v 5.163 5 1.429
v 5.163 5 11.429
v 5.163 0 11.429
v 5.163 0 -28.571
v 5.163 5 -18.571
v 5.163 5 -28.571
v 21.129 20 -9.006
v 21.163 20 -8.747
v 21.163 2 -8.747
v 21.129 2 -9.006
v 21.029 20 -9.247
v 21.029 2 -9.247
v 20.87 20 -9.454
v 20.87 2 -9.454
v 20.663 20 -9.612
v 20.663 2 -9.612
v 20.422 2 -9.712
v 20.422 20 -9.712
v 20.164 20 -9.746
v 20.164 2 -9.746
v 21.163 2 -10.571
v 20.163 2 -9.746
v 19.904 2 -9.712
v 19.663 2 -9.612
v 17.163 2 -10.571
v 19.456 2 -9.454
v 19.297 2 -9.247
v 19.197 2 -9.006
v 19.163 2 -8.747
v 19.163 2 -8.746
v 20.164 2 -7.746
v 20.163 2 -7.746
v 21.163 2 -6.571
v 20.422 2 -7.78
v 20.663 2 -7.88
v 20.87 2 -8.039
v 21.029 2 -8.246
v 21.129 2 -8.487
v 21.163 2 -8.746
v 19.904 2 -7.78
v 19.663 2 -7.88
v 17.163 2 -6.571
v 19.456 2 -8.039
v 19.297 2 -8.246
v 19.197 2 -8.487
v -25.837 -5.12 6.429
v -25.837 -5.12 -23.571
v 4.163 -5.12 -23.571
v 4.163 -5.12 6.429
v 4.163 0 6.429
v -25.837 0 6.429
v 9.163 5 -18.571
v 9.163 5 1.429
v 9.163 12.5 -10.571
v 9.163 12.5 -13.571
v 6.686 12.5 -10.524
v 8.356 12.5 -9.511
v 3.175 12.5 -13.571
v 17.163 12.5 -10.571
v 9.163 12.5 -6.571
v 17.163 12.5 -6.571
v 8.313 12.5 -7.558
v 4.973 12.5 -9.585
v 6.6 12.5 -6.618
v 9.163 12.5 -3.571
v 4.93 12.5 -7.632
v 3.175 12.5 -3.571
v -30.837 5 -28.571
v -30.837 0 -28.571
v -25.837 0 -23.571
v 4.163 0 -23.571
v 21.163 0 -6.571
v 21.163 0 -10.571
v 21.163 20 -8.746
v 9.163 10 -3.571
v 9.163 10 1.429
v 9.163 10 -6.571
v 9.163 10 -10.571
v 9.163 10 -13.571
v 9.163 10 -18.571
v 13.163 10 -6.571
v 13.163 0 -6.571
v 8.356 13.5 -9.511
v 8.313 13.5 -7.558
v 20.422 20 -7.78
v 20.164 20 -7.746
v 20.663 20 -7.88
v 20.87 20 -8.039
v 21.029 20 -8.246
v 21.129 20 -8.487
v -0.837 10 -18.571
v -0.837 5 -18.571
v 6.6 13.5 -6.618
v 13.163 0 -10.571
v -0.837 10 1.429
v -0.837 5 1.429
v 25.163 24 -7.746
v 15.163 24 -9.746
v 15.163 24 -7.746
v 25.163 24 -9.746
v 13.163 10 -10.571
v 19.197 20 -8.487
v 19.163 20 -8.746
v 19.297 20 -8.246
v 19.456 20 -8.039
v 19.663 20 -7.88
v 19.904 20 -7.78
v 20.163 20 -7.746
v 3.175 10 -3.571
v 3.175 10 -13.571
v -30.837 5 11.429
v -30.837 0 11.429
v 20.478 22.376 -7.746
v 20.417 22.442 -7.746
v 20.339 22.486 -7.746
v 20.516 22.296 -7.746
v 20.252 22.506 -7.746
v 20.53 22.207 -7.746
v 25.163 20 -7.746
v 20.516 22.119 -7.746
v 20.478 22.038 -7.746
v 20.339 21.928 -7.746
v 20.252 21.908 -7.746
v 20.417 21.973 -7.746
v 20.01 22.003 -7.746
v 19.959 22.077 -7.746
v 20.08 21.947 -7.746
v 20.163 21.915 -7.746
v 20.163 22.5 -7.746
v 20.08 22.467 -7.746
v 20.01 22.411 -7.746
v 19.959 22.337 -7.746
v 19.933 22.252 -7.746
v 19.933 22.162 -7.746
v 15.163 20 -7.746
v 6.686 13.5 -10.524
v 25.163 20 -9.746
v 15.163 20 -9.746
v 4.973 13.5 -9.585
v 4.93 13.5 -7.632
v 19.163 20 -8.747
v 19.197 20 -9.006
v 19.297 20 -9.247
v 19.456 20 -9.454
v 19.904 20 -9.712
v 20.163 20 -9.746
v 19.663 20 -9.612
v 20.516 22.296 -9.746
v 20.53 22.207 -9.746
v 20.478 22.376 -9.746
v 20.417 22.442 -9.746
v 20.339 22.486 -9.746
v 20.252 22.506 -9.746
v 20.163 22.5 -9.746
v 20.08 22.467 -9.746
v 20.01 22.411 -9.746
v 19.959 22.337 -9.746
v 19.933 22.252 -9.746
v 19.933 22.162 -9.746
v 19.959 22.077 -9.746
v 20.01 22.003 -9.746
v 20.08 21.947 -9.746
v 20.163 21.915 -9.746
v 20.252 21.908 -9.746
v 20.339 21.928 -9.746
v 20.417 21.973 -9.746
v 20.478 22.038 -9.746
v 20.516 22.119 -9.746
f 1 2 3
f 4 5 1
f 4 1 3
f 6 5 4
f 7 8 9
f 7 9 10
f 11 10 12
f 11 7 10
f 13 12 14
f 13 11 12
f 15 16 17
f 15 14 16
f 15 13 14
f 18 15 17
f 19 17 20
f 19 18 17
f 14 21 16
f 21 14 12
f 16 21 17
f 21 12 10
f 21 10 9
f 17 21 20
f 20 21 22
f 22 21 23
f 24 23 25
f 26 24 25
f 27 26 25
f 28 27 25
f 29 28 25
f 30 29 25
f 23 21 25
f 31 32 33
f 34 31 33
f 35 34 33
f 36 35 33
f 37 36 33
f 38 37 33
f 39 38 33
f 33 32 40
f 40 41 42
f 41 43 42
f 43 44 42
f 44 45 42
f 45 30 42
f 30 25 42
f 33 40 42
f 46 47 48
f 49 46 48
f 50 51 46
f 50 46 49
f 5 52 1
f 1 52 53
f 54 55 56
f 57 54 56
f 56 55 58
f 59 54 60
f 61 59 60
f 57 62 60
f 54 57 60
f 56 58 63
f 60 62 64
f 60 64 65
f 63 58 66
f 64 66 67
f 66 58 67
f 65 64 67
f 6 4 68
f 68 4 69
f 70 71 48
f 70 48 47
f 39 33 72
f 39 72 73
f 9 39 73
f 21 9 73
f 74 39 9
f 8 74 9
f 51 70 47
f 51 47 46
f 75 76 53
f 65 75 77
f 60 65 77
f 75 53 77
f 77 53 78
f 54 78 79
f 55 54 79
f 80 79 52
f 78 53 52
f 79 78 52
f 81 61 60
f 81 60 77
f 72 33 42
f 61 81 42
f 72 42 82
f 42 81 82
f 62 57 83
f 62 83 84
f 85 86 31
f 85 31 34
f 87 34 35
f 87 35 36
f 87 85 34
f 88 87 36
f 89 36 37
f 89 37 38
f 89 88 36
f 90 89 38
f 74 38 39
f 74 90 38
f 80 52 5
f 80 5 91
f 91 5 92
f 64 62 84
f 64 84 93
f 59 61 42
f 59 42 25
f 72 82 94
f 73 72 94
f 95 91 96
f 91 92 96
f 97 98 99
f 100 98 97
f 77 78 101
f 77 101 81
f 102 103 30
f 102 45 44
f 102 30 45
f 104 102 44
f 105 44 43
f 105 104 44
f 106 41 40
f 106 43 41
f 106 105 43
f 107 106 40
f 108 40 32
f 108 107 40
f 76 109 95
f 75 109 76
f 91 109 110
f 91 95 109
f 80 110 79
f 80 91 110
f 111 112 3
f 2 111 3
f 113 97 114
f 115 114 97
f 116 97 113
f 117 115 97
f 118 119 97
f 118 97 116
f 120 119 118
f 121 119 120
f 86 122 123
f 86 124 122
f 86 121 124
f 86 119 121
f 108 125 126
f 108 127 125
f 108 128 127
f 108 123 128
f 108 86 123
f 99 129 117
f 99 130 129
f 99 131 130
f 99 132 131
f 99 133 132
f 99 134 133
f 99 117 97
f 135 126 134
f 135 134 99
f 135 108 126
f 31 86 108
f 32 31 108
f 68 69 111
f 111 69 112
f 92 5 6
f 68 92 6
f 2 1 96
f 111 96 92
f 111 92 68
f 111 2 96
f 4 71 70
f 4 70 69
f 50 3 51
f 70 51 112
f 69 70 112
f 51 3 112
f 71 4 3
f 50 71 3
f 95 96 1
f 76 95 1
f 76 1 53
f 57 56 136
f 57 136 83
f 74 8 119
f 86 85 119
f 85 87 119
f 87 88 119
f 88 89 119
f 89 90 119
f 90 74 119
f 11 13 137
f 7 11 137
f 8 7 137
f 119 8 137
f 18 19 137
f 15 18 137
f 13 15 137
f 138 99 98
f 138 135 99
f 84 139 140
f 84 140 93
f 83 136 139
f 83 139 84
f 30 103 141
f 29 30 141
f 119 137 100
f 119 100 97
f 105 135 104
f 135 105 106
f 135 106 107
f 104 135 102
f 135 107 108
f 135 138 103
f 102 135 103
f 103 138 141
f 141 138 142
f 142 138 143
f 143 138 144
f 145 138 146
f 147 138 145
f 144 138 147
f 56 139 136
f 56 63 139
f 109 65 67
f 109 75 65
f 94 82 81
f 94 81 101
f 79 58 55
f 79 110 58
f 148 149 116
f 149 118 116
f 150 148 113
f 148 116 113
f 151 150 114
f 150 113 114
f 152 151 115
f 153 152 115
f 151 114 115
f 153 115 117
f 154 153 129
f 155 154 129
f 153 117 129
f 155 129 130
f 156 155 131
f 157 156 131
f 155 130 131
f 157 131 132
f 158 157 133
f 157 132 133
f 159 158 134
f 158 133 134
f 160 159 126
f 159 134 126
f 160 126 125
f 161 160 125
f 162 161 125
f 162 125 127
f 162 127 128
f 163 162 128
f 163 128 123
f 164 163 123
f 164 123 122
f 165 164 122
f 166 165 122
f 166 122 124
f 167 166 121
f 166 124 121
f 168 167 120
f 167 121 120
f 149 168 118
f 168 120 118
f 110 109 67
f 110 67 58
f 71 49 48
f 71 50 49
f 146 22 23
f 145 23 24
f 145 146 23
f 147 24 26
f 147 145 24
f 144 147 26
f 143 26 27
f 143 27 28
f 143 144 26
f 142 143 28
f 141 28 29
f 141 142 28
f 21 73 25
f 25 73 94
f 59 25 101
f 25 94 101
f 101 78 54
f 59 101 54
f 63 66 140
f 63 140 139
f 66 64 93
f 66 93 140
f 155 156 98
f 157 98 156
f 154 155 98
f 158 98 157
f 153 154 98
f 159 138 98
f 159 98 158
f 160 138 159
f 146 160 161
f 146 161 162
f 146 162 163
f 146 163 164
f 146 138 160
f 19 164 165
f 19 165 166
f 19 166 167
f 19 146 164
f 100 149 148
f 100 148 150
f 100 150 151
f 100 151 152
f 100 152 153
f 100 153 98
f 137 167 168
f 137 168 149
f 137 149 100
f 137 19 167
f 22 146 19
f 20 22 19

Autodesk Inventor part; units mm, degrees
ref_plane "YZ Plane" through (0, 0, 0) normal (1, 0, 0) x (0, 1, 0)
ref_plane "XZ Plane" through (0, 0, 0) normal (0, 1, 0) x (-1, 0, 0)
ref_plane "XY Plane" through (0, 0, 0) normal (0, 0, 1) x (1, 0, 0)
sketch "Sketch1" plane through (0, 0, 0) normal (0, 1, 0) x (-1, 0, 0)
  line L0 (30.8368, 11.4286) -> (-9.1632, 11.4286)
  line L1 (-9.1632, 11.4286) -> (-9.1632, -28.5714)
  line L2 (-9.1632, -28.5714) -> (30.8368, -28.5714)
  line L3 (30.8368, -28.5714) -> (30.8368, 11.4286)
  point P0 (0, 0)
  dimension "d0" = 40
  dimension "d1" = 40
extrude "Extrusion1" add sketch "Sketch1" along normal blind 5
sketch "Sketch7" plane through (9.1632, 0, -28.5714) normal (1, 0, 0) x (0, 0, -1)
  point P0 (-28.5714, 0)
sketch "Sketch8" plane through (0, 0, 0) normal (0, -1, 0) x (1, 0, 0)
  point P0 (0, 0)
sketch "Sketch11" plane through (0, 5, 0) normal (0, 1, 0) x (1, 0, 0)
  line L0 (9.1632, -11.4286) -> (9.1632, 28.5714) projected
  line L1 (9.1632, 18.5714) -> (-0.8368, 18.5714)
  line L2 (-0.8368, 18.5714) -> (-0.8368, -1.4286)
  line L3 (-0.8368, -1.4286) -> (9.1632, -1.4286)
  line L4 (9.1632, -1.4286) -> (9.1632, 18.5714)
  line L5 (-30.8368, -11.4286) -> (9.1632, -11.4286) projected
  point P0 (0, 0)
  dimension "d29" = 10
  dimension "d30" = 20
  dimension "d31" = 10
extrude "Extrusion7" add sketch "Sketch11" along normal blind 5
sketch "Sketch12" plane through (0, 10, 0) normal (0, 1, 0) x (1, 0, 0)
  line L0 (9.1632, -1.4286) -> (9.1632, 18.5714) projected
  line L1 (3.175, 13.5714) -> (9.1632, 13.5714)
  line L2 (9.1632, 13.5714) -> (9.1632, 3.5714)
  line L3 (9.1632, 3.5714) -> (3.175, 3.5714)
  line L4 (3.175, 3.5714) -> (3.175, 13.5714)
  line L5 (9.1632, 18.5714) -> (-0.8368, 18.5714) projected
  point P0 (0, 0)
  dimension "d34" = 10
  dimension "d35" = 5
extrude "Extrusion8" add sketch "Sketch12" along normal blind 2.5
sketch "Sketch13" plane through (9.1632, 0, 11.4286) normal (1, 0, 0) x (0, 0, -1)
  line L0 (25, 12.5) -> (15, 12.5) projected
  line L1 (30, 10) -> (10, 10) projected
  line L2 (18, 12.5) -> (22, 12.5)
  line L3 (22, 12.5) -> (22, 10)
  line L4 (22, 10) -> (18, 10)
  line L5 (18, 10) -> (18, 12.5)
  line L6 (15, 10) -> (15, 12.5) projected
  point P0 (11.4286, 0)
  dimension "d38" = 4
  dimension "d39" = 3
extrude "Extrusion9" add sketch "Sketch13" along normal blind 4 contours L3 L1 L5 L0
sketch "Sketch14" plane through (0, 0, 0) normal (0, -1, 0) x (1, 0, 0)
  line L0 (4.1632, 6.4286) -> (-25.8368, 6.4286)
  line L1 (-25.8368, 6.4286) -> (-25.8368, -23.5714)
  line L2 (-25.8368, -23.5714) -> (4.1632, -23.5714)
  line L3 (4.1632, -23.5714) -> (4.1632, 6.4286)
  line L4 (9.1632, 11.4286) -> (9.1632, -28.5714) projected
  line L5 (9.1632, -28.5714) -> (-30.8368, -28.5714) projected
  point P0 (0, 0)
  dimension "d42" = 30
  dimension "d43" = 30
  dimension "d44" = 5
  dimension "d45" = 5
extrude "Extrusion10" add sketch "Sketch14" along normal blind 4
sketch "Sketch15" plane through (13.1632, 0, 11.4286) normal (1, 0, 0) x (0, 0, -1)
  line L0 (25, 12.5) -> (15, 12.5) projected
  line L1 (18.0261, 12.5) -> (22.0261, 12.5)
  line L2 (22.0261, 12.5) -> (22.0261, -15.875)
  line L3 (22.0261, -15.875) -> (18.0261, -15.875)
  line L4 (18.0261, -15.875) -> (18.0261, 12.5)
  point P0 (11.4286, 0)
  dimension "d48" = 4
extrude "Extrusion11" add sketch "Sketch15" along normal blind 4
sketch "Sketch30" plane through (13.1632, -15.875, -6.5975) normal (0, 0, 1) x (1, 0, 0)
  point P0 (-13.1632, 15.875)
sketch "Sketch31" plane through (17.1632, 0, 11.4286) normal (1, 0, 0) x (0, 0, -1)
  line L0 (18.0261, 10) -> (18.0261, -15.875) projected
  line L1 (22.0261, -15.875) -> (22.0261, 12.5) projected
  line L2 (18.0261, -15.875) -> (22.0261, -15.875)
  line L3 (22.0261, -15.875) -> (22.0261, -13.875)
  line L4 (22.0261, -13.875) -> (18.0261, -13.875)
  line L5 (18.0261, -13.875) -> (18.0261, -15.875)
  line L6 (18.0261, 12.5) -> (22.0261, 12.5)
  line L7 (22.0261, 12.5) -> (22.0261, -15.875)
  line L8 (22.0261, -15.875) -> (18.0261, -15.875)
  line L9 (18.0261, -15.875) -> (18.0261, 12.5)
  point P0 (11.4286, 0)
  dimension "d75" = 2
extrude "Extrusion21" cut sketch "Sketch31" against normal blind 4 contours L9 L6 L1 L4 L0
sketch "Sketch32" plane through (17.1632, 0, 11.4286) normal (1, 0, 0) x (0, 0, -1)
  line L0 (15.875, -11.1125) -> (23.8125, -11.1125)
  line L1 (23.8125, -11.1125) -> (23.8125, -20.6375)
  line L2 (23.8125, -20.6375) -> (15.875, -20.6375)
  line L3 (15.875, -20.6375) -> (15.875, -11.1125)
  point P0 (11.4286, 0)
extrude "Extrusion22" cut sketch "Sketch32" against normal blind 4
sketch "Sketch33" plane through (13.1632, 0, 11.4286) normal (1, 0, 0) x (0, 0, -1)
  line L0 (25, 12.5) -> (15, 12.5) projected
  line L1 (5, 0) -> (35, 0) projected
  line L2 (18, 12.5) -> (22, 12.5)
  line L3 (22, 12.5) -> (22, 0)
  line L4 (22, 0) -> (18, 0)
  line L5 (18, 0) -> (18, 12.5)
  line L6 (18, 12.5) -> (18, 10) projected
  point P0 (11.4286, 0)
  dimension "d80" = 4
  dimension "d81" = 0
extrude "Extrusion23" add sketch "Sketch33" along normal blind 4
sketch "Sketch34" plane through (17.1632, 0, 11.4286) normal (1, 0, 0) x (0, 0, -1)
  line L0 (5, 0) -> (35, 0) projected
  line L1 (22, 0) -> (22, 10) projected
  line L2 (18, 0) -> (22, 0)
  line L3 (22, 0) -> (22, 2)
  line L4 (22, 2) -> (18, 2)
  line L5 (18, 2) -> (18, 0)
  line L6 (18, 12.5) -> (18, 0) projected
  point P0 (11.4286, 0)
  dimension "d84" = 2
  dimension "d85" = 0
extrude "Extrusion24" add sketch "Sketch34" along normal blind 2
sketch "Sketch35" plane through (17.1632, 2, -6.5714) normal (0, 1, 0) x (1, 0, 0)
  point P0 (-17.1632, -6.5714)
sketch "Sketch36" plane through (19.1632, 0, 11.4286) normal (1, 0, 0) x (0, 0, -1)
  line L0 (22, 0) -> (22, 10) projected
  line L1 (22, 2) -> (18, 2)
  line L2 (18, 2) -> (18, 0)
  line L3 (18, 0) -> (22, 0)
  line L4 (22, 0) -> (22, 2)
  point P0 (11.4286, 0)
  dimension "d88" = 4
  dimension "d89" = 2
extrude "Extrusion25" add sketch "Sketch36" along normal blind 2
sketch "Sketch37" plane through (17.1632, 2, -6.5714) normal (0, 1, 0) x (1, 0, 0)
  line L0 (2, 3.175) -> (4, 3.175)
  line L1 (4, 3.175) -> (4, 1.175)
  line L2 (4, 1.175) -> (2, 1.175)
  line L3 (2, 1.175) -> (2, 3.175)
  line L4 (4, 4) -> (4, 0) projected
  point P0 (-17.1632, -6.5714)
  dimension "d92" = 2
  dimension "d93" = 2
  dimension "d94" = 0
extrude "Extrusion26" add sketch "Sketch37" along normal blind 18
sketch "Sketch38" plane through (17.1632, 20, -6.5714) normal (0, 1, 0) x (1, 0, 0)
  line L0 (-2, 3.175) -> (8, 3.175)
  line L1 (8, 3.175) -> (8, 1.175)
  line L2 (8, 1.175) -> (-2, 1.175)
  line L3 (-2, 1.175) -> (-2, 3.175)
  line L4 (4, 3.175) -> (2, 3.175) projected
  line L5 (4, 1.175) -> (4, 3.175) projected
  line L6 (2, 3.175) -> (2, 1.175) projected
  point P0 (-17.1632, -6.5714)
  dimension "d97" = 2
  dimension "d98" = 0
  dimension "d99" = 4
  dimension "d100" = 4
extrude "Extrusion27" add sketch "Sketch38" along normal blind 4
fillet "Fillet1" radius 1 4 edges at (21.1632, 11, -9.7464) (19.1632, 11, -9.7464) (19.1632, 11, -7.7464) (21.1632, 11, -7.7464)
sketch "Sketch40" plane through (15.1632, 24, -7.7464) normal (0, 0, 1) x (1, 0, 0)
  circle A0 centre (5.0665, -1.7928) radius 0.3
  point P0 (-15.1632, -24)
  dimension "d110" = 0.6
extrude "Extrusion29" cut sketch "Sketch40" against normal blind 100
sketch "Sketch41" plane through (15.1632, 24, -7.7464) normal (0, 0, 1) x (1, 0, 0)
  circle A0 centre (5.0665, -1.7928) radius 0.3 projected
  circle A1 centre (5.0665, -1.7928) radius 0.3
  point P0 (-15.1632, -24)
sketch "Sketch42" plane through (0, -4, 0) normal (0, -1, 0) x (1, 0, 0)
  line L0 (4.1632, 6.4286) -> (4.1632, -23.5714) projected
  line L1 (-25.8368, 6.4286) -> (4.1632, 6.4286) projected
  line L2 (4.1632, -23.5714) -> (-25.8368, -23.5714)
  line L3 (-25.8368, -23.5714) -> (-25.8368, 6.4286)
  line L4 (-25.8368, 6.4286) -> (4.1632, 6.4286)
  line L5 (4.1632, 6.4286) -> (4.1632, -23.5714)
  point P0 (0, 0)
extrude "Extrusion30" add sketch "Sketch42" along normal blind 10
sketch "Sketch43" plane through (0, 12.5, 0) normal (0, 1, 0) x (1, 0, 0)
  line L0 (4.973, 9.5849) -> (6.6857, 10.5243)
  line L1 (6.6857, 10.5243) -> (8.3555, 9.5108)
  line L2 (8.3555, 9.5108) -> (8.3127, 7.5579)
  line L3 (8.3127, 7.5579) -> (6.6, 6.6185)
  line L4 (6.6, 6.6185) -> (4.9302, 7.632)
  line L5 (4.9302, 7.632) -> (4.973, 9.5849)
  point P0 (0, 0)
  point P1 (6.6429, 8.5714)
extrude "Extrusion31" add sketch "Sketch43" along normal blind 1
sketch "Sketch44" plane through (0, 0, 0) normal (0, -1, 0) x (1, 0, 0)
  circle A0 centre (6.6857, -8.642) radius 1.5
  point P0 (0, 0)
  dimension "d117" = 3
extrude "Extrusion32" add sketch "Sketch44" along normal blind 1
sketch "Sketch45" plane through (4.1632, 0, -23.5714) normal (0, 0, -1) x (-1, 0, 0)
  line L0 (30, -14) -> (0, -14) projected
  line L1 (30, 0) -> (30, -14) projected
  line L2 (0, -14) -> (30, -14)
  line L3 (30, -14) -> (30, -5.1197)
  line L4 (30, -5.1197) -> (0, -5.1197)
  line L5 (0, -5.1197) -> (0, -14)
  point P0 (4.1632, 0)
extrude "Extrusion33" cut sketch "Sketch45" against normal blind 100
sketch "Sketch46" plane through (-25.8368, -5.1197, -23.5714) normal (0, -1, 0) x (1, 0, 0)
  point P0 (25.8368, 23.5714)
sketch "Sketch47" plane through (9.1632, 0, 11.4286) normal (1, 0, 0) x (0, 0, -1)
  line L0 (35, -5.1197) -> (5, -5.1197) projected
  line L1 (40, 5) -> (0, 5) projected
  line L2 (35, -5.1197) -> (0, -5.1197)
  line L3 (0, -5.1197) -> (0, 5)
  line L4 (0, 5) -> (35, 5)
  line L5 (30, 5) -> (40, 5) projected
  line L6 (35, 5) -> (40, 5)
  line L7 (40, 0) -> (40, 5) projected
  line L8 (40, 5) -> (40, -5.1197)
  line L9 (40, -5.1197) -> (33.3375, -5.1197)
  point P0 (11.4286, 0)
  point P1 (5, -5.1197)
extrude "Extrusion34" cut sketch "Sketch47" against normal blind 4
properties part number "upper plate"
